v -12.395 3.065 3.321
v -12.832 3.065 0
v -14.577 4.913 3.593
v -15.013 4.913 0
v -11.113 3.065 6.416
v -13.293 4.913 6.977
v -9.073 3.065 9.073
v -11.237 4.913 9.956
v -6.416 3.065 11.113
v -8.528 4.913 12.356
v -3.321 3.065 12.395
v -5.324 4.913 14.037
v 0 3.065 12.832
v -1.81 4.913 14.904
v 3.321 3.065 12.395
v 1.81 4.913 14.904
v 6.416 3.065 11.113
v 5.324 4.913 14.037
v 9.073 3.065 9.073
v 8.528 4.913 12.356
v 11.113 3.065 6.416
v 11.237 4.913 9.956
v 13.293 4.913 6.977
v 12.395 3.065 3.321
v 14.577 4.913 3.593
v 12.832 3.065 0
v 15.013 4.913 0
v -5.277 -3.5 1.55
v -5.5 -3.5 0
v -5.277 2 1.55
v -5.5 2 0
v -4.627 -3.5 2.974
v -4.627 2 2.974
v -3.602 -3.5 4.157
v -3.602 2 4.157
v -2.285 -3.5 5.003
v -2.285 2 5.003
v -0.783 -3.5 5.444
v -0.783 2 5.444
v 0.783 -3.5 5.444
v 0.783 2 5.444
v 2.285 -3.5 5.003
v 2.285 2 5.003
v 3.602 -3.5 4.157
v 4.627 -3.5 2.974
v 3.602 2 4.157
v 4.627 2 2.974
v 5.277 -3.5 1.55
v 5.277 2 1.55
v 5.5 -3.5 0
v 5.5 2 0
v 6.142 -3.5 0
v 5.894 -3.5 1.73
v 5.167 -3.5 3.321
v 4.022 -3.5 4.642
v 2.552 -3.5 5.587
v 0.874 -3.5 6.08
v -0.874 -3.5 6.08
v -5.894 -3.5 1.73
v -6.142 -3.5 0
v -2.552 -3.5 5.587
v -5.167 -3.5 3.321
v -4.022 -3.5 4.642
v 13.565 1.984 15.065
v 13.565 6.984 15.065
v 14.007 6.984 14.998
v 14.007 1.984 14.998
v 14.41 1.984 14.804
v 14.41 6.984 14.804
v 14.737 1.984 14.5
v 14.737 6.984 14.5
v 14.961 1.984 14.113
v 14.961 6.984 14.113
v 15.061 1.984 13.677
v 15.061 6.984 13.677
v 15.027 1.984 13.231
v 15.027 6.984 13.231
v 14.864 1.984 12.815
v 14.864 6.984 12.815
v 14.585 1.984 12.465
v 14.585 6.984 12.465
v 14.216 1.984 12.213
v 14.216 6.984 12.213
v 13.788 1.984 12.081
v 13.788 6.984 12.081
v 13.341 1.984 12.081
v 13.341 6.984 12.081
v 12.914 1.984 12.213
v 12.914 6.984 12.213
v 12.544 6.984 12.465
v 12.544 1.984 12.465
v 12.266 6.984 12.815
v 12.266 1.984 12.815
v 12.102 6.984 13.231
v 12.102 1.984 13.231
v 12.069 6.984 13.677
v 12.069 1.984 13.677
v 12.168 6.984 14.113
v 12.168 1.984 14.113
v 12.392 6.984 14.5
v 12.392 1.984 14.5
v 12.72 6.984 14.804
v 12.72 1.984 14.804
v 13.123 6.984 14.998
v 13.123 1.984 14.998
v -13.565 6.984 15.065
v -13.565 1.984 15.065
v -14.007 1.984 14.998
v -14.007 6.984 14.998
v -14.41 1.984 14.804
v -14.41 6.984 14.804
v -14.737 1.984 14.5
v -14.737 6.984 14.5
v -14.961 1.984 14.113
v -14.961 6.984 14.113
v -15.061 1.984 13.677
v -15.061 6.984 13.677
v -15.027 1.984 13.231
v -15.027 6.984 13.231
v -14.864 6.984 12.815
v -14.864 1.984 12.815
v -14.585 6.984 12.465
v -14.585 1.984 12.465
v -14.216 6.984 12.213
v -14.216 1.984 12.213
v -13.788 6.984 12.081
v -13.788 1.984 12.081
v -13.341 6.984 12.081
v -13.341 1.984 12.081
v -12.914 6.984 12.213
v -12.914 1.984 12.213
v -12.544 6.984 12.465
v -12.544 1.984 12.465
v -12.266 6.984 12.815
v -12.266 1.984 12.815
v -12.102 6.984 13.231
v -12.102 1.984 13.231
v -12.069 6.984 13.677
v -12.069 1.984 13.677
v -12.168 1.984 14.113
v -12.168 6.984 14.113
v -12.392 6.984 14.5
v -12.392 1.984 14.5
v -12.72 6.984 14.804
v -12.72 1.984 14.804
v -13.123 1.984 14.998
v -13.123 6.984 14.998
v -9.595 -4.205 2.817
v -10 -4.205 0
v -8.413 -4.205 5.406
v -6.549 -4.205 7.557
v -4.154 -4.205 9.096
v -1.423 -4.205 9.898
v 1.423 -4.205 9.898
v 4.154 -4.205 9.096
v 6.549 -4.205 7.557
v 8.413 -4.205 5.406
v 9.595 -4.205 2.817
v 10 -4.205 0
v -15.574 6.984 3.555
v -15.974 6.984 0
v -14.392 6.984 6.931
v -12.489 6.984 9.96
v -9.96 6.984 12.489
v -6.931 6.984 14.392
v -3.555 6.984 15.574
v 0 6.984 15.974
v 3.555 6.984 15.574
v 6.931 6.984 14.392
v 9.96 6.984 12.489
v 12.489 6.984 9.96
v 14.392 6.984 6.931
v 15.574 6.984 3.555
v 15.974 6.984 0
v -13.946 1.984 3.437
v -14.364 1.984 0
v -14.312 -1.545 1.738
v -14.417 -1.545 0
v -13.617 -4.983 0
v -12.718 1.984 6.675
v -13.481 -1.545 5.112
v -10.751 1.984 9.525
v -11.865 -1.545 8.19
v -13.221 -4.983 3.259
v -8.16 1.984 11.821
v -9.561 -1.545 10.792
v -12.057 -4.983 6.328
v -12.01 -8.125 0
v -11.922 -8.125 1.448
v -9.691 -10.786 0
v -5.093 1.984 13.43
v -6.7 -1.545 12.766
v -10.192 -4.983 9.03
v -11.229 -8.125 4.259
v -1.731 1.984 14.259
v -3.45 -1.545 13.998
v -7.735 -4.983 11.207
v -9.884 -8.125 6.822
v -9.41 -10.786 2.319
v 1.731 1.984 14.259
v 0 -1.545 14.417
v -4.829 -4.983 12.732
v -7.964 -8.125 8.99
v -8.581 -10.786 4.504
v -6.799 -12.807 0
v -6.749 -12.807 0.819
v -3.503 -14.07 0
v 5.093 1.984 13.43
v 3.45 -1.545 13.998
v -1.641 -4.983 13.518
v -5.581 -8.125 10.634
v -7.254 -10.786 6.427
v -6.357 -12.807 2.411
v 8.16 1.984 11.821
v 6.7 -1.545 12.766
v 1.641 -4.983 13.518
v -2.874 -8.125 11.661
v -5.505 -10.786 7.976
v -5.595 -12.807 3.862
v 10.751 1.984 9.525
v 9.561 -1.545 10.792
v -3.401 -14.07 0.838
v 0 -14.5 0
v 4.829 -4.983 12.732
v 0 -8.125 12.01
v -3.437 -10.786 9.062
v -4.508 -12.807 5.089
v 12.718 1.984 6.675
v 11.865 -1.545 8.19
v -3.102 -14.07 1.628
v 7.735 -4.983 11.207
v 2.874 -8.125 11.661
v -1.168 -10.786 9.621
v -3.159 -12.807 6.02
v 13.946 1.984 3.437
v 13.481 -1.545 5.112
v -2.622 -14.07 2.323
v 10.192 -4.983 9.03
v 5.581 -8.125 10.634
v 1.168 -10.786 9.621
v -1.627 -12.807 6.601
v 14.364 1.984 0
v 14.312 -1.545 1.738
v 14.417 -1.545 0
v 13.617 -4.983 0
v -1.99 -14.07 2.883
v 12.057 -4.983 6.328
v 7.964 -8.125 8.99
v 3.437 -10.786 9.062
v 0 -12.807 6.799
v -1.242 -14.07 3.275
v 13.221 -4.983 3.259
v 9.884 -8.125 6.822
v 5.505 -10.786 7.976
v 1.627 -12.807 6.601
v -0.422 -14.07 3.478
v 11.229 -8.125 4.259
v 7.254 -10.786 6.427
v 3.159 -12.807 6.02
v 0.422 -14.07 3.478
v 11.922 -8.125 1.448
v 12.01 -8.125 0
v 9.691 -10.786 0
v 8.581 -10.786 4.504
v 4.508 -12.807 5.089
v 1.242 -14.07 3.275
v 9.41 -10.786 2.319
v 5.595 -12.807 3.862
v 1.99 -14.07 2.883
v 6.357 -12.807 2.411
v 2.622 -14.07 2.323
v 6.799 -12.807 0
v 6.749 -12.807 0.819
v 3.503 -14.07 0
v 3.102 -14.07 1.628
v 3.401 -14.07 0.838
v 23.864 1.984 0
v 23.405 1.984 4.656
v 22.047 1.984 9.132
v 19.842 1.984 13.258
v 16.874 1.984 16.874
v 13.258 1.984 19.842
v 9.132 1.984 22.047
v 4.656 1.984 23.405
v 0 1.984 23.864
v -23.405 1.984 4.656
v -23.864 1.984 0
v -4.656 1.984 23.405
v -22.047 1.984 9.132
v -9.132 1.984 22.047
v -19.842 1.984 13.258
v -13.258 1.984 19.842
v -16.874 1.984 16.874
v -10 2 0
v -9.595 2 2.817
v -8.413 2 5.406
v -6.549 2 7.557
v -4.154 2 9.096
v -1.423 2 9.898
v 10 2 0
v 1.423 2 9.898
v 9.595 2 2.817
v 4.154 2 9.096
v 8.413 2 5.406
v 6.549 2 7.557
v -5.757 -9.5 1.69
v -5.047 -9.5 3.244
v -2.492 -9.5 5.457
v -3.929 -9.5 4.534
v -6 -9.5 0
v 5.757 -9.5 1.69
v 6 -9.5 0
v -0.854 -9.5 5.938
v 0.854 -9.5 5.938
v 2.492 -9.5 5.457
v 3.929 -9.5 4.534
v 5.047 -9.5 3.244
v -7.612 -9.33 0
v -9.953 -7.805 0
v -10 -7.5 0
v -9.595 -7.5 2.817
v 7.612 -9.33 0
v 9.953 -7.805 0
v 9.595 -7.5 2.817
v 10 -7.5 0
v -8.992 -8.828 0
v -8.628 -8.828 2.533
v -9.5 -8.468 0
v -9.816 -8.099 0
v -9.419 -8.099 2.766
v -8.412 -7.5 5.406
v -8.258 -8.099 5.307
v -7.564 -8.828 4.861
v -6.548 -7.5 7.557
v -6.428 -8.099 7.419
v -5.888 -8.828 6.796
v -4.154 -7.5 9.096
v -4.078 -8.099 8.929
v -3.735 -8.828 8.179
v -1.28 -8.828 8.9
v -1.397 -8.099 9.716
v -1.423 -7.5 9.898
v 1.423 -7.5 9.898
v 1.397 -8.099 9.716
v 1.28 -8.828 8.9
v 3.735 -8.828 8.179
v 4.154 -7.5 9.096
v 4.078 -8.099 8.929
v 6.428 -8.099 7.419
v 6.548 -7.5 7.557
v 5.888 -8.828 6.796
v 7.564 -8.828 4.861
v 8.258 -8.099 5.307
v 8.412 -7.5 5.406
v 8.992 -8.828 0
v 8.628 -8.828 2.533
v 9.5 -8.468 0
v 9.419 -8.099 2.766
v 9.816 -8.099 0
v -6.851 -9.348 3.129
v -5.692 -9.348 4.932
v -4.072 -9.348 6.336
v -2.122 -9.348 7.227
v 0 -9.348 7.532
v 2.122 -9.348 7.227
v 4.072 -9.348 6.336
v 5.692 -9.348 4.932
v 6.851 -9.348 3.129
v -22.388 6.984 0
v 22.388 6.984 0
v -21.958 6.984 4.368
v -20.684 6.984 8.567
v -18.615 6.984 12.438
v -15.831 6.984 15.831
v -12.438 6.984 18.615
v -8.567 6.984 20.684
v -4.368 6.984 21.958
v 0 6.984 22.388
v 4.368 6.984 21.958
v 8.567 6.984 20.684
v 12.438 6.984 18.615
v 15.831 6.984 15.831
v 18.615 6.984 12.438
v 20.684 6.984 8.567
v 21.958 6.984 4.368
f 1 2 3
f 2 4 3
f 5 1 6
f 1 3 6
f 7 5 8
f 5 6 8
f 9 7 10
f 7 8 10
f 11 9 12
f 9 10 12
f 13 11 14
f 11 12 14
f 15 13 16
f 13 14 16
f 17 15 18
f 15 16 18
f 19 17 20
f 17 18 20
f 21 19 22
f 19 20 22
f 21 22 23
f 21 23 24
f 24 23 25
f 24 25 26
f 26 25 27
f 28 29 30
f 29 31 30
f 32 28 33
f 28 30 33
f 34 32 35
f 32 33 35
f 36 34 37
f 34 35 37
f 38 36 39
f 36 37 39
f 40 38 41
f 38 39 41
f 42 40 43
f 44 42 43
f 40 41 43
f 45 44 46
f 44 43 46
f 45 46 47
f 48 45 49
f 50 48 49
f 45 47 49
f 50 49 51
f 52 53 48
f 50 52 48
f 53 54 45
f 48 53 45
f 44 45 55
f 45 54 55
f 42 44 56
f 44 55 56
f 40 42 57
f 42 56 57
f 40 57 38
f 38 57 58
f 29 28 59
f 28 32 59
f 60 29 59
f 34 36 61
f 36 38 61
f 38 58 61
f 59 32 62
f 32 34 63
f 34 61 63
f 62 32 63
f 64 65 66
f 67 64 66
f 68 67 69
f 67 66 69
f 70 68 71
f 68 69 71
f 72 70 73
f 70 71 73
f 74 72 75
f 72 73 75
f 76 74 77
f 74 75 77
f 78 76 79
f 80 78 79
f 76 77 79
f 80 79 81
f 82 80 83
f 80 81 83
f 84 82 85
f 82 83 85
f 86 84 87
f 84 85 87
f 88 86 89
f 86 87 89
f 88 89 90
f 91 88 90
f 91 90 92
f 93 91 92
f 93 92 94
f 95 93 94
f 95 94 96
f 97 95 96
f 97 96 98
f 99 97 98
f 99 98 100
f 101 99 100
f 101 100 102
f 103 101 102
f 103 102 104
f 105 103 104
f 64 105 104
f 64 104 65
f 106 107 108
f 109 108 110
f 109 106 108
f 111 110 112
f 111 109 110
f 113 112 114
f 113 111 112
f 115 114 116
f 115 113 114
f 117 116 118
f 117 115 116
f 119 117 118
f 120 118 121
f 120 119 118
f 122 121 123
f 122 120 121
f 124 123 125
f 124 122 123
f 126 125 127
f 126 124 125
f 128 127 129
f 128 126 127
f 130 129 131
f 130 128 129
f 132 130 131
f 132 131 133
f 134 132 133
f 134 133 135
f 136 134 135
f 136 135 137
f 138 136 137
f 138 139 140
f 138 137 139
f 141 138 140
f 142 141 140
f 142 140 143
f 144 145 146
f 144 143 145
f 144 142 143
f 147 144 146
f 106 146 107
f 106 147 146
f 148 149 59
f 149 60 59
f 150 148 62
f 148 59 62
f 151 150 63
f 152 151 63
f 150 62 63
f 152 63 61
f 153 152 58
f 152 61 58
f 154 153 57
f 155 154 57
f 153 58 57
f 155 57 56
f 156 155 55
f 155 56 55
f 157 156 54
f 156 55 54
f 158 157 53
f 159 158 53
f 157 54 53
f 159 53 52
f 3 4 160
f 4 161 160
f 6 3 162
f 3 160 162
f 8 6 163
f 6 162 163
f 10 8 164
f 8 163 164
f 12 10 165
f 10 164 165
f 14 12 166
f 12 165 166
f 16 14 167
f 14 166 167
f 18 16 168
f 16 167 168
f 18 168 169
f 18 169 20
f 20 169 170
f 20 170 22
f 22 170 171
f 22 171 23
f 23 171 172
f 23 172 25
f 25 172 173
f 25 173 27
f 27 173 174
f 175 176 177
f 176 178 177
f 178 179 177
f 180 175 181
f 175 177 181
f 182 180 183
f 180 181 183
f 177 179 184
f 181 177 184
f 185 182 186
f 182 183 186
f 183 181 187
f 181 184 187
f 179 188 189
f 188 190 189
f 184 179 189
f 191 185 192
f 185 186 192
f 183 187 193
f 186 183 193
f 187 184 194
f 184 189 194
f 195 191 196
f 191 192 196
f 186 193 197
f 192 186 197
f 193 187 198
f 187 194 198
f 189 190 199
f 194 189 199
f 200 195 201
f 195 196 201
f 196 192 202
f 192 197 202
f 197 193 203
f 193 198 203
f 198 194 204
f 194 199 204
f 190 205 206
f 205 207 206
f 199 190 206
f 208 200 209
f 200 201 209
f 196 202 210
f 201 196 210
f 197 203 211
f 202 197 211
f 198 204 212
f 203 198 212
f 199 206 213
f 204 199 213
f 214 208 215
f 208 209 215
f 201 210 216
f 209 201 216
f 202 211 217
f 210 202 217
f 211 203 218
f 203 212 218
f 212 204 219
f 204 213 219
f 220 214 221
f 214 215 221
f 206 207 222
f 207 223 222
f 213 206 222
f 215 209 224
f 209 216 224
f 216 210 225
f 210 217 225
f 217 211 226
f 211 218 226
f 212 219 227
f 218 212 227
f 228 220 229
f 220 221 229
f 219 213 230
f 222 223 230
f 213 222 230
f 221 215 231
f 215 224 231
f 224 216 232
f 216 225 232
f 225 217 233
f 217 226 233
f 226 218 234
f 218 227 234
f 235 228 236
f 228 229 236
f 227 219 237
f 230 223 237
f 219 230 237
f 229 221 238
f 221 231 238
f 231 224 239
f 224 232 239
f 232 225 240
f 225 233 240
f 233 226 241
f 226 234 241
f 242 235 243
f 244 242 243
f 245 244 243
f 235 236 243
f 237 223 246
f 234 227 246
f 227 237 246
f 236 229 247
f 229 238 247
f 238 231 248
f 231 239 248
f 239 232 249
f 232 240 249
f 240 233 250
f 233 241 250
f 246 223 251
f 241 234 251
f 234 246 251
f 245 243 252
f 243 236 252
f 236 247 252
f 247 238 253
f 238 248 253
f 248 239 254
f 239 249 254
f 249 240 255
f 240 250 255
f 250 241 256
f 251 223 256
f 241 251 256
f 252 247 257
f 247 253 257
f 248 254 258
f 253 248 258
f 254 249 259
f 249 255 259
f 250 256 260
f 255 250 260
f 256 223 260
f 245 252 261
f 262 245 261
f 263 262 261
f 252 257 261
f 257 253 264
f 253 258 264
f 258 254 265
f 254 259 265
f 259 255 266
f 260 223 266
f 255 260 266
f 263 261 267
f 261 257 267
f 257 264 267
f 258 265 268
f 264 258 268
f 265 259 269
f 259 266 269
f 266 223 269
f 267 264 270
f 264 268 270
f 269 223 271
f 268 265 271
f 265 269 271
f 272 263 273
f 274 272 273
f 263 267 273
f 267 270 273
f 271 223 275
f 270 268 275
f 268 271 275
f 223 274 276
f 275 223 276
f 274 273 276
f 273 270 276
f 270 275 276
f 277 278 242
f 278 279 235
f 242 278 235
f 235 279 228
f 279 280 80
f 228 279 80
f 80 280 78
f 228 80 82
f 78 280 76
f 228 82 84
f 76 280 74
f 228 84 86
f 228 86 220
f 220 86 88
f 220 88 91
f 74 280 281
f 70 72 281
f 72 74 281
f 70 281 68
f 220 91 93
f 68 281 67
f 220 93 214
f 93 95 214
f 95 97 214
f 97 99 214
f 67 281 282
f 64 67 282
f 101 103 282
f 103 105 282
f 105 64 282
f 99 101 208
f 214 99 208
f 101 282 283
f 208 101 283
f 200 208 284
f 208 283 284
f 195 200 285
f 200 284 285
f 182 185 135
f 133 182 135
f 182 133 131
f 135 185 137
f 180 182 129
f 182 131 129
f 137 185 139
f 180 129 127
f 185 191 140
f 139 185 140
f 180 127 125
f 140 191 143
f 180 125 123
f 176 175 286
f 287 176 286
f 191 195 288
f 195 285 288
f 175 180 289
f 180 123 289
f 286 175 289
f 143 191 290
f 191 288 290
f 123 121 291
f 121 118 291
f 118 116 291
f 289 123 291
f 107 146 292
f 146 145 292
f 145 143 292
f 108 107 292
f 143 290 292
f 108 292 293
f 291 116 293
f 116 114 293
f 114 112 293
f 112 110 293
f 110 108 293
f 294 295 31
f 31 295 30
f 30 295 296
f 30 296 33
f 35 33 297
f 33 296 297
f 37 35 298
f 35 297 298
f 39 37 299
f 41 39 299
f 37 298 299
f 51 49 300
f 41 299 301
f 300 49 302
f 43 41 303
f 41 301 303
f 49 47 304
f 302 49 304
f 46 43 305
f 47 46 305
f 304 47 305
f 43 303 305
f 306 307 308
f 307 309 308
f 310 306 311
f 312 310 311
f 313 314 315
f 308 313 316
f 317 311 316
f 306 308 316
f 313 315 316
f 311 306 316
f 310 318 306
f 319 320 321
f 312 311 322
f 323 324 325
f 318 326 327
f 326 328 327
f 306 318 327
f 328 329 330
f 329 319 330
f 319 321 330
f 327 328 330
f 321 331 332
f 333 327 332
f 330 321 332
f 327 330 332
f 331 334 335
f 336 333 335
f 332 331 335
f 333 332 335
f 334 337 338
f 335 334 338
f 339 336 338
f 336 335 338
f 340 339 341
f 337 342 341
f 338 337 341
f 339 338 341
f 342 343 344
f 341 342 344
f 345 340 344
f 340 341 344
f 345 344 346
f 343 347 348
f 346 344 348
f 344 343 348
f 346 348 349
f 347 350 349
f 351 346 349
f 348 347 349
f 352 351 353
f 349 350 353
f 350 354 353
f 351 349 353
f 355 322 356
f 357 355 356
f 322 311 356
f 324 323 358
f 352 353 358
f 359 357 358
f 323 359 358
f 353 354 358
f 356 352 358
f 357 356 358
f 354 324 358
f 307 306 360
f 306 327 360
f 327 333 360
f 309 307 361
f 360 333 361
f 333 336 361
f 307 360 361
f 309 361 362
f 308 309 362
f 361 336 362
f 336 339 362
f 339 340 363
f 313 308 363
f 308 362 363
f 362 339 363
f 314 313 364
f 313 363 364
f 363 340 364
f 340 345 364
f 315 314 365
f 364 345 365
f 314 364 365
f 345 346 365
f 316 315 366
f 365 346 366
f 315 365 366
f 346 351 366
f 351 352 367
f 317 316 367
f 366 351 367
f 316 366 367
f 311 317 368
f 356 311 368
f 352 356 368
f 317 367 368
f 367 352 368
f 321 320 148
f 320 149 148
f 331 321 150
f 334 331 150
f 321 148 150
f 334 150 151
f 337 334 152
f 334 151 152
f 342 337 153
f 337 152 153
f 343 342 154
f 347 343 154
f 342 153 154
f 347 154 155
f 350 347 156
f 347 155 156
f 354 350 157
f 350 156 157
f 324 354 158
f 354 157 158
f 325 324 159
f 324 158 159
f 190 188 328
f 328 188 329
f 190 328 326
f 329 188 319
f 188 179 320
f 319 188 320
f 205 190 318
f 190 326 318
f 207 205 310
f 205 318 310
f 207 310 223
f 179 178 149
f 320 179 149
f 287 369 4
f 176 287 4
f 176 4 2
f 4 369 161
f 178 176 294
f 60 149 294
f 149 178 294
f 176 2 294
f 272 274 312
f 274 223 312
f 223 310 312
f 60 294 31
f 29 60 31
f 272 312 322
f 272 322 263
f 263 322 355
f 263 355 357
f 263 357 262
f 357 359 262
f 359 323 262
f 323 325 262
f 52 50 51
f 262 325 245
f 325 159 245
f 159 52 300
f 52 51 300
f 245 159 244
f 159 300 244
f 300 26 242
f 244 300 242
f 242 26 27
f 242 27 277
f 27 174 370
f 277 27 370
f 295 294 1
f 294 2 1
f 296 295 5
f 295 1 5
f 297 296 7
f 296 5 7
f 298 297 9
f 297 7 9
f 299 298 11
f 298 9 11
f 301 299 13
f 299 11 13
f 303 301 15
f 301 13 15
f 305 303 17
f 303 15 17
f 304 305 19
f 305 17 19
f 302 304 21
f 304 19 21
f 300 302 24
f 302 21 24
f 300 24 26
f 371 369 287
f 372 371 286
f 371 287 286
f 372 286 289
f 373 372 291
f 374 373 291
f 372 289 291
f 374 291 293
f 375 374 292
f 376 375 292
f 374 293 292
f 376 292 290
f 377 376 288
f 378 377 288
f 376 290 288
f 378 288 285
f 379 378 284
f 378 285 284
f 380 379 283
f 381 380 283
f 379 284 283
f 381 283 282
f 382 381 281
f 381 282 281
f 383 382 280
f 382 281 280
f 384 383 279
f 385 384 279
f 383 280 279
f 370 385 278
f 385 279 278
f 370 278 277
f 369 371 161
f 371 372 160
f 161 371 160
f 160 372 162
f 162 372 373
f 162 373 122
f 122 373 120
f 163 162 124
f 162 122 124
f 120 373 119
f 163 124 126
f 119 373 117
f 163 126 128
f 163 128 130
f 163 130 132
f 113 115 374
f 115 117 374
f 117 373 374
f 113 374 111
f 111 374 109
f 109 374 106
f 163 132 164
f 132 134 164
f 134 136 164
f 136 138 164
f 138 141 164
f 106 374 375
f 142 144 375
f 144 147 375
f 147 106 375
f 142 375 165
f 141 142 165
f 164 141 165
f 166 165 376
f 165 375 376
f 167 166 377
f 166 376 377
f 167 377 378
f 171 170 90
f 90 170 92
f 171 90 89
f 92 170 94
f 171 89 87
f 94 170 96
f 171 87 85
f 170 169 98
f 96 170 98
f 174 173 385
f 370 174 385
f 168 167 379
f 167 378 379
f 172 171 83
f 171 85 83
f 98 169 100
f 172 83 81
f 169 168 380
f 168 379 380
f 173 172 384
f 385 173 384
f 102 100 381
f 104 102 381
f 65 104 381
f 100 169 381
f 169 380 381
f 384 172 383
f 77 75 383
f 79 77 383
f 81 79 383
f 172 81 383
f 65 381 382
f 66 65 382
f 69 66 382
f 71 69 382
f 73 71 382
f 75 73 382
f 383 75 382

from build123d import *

# Parameters (mm, degrees)
REVOLVE1_ANGLE     = 180
FILLET1_SIZE       = 4
FILLET1_SIZE_2     = 2
CHAMFER1_SIZE      = 4
CHAMFER1_SIZE2     = 0.705307923
REVOLVE2_ANGLE     = 180
SKETCH3_R          = 1.5
CUT_EXTRUDE1_DEPTH = 10


with BuildPart() as part:
    # Sketch1 → Revolve1 (revolve)
    with BuildSketch(Plane.XY):
        Polygon((0, -9.5), (0, 2), (-5.5, 2), (-5.5, -3.5), (-10, -3.5), (-10, -9.5), align=None)
    revolve(axis=Axis((0, -14.5, 0), (0, 1, 0)), revolution_arc=REVOLVE1_ANGLE)

    # Fillet1
    # an asymmetric fillet: 4, 2 mm, written as the material it takes off along each edge
    with BuildSketch(Plane(origin=(0, -9.5, 0), x_dir=(-0.5389483633149525, 0, -0.8423388045674578), z_dir=(0.8423388045674578, 0, -0.5389483633149525))) as fillet1_piece_1:
        with BuildLine():
            Bezier((10 - FILLET1_SIZE, 0), (10, 0), (10, FILLET1_SIZE_2), weights=[1, 0.707106781, 1])
            Line((10, FILLET1_SIZE_2), (10, 0))
            Line((10, 0), (10 - FILLET1_SIZE, 0))
        make_face()
    revolve(axis=Axis((0, -9.5, 0), (0, 1, 0)), revolution_arc=294.775843921, mode=Mode.SUBTRACT)

    # Chamfer1
    chamfer1_edges = [part.edges().sort_by_distance(p)[0] for p in [
        (0, -3.5, 10),
    ]]
    chamfer1_side = [part.faces().sort_by_distance(p)[0] for p in [
        (0, -3.5, 5.723606798),
    ]]
    chamfer(chamfer1_edges, length=CHAMFER1_SIZE, length2=CHAMFER1_SIZE2, reference=chamfer1_side[0])


with BuildPart() as body_2:
    # Sketch2 → Revolve2 (revolve)
    with BuildSketch(Plane.XY):
        with BuildLine():
            Line((-5.5, 2), (-10, 2))
            Line((-10, 2), (-12.831859955, 3.064721462))
            Line((-12.831859955, 3.064721462), (-15.01308486, 4.913217144))
            Line((-15.01308486, 4.913217144), (-15.974302614, 6.983532307))
            Line((-15.974302614, 6.983532307), (-19.387891627, 6.983532307))
            Line((-19.387891627, 6.983532307), (-22.387891627, 6.983532307))
            Line((-22.387891627, 6.983532307), (-23.863690319, 1.983532307))
            Line((-23.863690319, 1.983532307), (-14.363690319, 1.983532307))
            ThreePointArc((-14.363690319, 1.983532307), (-10.931862112, -9.525985029), (0, -14.5))
            Line((0, -14.5), (0, -9.5))
            Line((0, -9.5), (-5.99955163, -9.5))
            add(Edge.make_bspline(
                [(-5.99955163, -9.5), (-6.613966051, -9.500022958), (-7.200553434, -9.407759327), (-7.834490948, -9.308048049), (-8.370669156, -9.110794638), (-9.014660015, -8.873878269), (-9.427521538, -8.530743599), (-9.68430445, -8.317327925), (-9.82887241, -8.078117533), (-9.999615313, -7.795596589), (-9.999626359, -7.5)],
                knots=[0, 0, 0, 0.25, 0.25, 0.5, 0.5, 0.75, 0.75, 0.875, 0.875, 1, 1, 1], degree=2))
            Line((-9.999626359, -7.5), (-10, -4.205307923))
            Line((-10, -4.205307923), (-6.14232061, -3.5))
            Line((-6.14232061, -3.5), (-5.5, -3.5))
            Line((-5.5, -3.5), (-5.5, 2))
        make_face()
    revolve(axis=Axis((0, -9.5, 0), (0, 1, 0)), revolution_arc=REVOLVE2_ANGLE)

    # Sketch3 → Cut-Extrude1 (cut)
    with BuildSketch(Plane(origin=(0, 6.983532307, 0), x_dir=(1, 0, 0), z_dir=(0, 1, 0))):
        with Locations(Location((13.564701596, -13.564701596, 0), (0, 0, 270))):
            Circle(SKETCH3_R)
    cut_extrude1 = extrude(amount=-CUT_EXTRUDE1_DEPTH, mode=Mode.SUBTRACT)

    # Mirror1: Cut-Extrude1 across plane
    add(cut_extrude1.mirror(Plane(origin=(0, 0, 0), x_dir=(0, 0, 1), z_dir=(1, 0, 0))), mode=Mode.SUBTRACT)


solid = body_2.part
